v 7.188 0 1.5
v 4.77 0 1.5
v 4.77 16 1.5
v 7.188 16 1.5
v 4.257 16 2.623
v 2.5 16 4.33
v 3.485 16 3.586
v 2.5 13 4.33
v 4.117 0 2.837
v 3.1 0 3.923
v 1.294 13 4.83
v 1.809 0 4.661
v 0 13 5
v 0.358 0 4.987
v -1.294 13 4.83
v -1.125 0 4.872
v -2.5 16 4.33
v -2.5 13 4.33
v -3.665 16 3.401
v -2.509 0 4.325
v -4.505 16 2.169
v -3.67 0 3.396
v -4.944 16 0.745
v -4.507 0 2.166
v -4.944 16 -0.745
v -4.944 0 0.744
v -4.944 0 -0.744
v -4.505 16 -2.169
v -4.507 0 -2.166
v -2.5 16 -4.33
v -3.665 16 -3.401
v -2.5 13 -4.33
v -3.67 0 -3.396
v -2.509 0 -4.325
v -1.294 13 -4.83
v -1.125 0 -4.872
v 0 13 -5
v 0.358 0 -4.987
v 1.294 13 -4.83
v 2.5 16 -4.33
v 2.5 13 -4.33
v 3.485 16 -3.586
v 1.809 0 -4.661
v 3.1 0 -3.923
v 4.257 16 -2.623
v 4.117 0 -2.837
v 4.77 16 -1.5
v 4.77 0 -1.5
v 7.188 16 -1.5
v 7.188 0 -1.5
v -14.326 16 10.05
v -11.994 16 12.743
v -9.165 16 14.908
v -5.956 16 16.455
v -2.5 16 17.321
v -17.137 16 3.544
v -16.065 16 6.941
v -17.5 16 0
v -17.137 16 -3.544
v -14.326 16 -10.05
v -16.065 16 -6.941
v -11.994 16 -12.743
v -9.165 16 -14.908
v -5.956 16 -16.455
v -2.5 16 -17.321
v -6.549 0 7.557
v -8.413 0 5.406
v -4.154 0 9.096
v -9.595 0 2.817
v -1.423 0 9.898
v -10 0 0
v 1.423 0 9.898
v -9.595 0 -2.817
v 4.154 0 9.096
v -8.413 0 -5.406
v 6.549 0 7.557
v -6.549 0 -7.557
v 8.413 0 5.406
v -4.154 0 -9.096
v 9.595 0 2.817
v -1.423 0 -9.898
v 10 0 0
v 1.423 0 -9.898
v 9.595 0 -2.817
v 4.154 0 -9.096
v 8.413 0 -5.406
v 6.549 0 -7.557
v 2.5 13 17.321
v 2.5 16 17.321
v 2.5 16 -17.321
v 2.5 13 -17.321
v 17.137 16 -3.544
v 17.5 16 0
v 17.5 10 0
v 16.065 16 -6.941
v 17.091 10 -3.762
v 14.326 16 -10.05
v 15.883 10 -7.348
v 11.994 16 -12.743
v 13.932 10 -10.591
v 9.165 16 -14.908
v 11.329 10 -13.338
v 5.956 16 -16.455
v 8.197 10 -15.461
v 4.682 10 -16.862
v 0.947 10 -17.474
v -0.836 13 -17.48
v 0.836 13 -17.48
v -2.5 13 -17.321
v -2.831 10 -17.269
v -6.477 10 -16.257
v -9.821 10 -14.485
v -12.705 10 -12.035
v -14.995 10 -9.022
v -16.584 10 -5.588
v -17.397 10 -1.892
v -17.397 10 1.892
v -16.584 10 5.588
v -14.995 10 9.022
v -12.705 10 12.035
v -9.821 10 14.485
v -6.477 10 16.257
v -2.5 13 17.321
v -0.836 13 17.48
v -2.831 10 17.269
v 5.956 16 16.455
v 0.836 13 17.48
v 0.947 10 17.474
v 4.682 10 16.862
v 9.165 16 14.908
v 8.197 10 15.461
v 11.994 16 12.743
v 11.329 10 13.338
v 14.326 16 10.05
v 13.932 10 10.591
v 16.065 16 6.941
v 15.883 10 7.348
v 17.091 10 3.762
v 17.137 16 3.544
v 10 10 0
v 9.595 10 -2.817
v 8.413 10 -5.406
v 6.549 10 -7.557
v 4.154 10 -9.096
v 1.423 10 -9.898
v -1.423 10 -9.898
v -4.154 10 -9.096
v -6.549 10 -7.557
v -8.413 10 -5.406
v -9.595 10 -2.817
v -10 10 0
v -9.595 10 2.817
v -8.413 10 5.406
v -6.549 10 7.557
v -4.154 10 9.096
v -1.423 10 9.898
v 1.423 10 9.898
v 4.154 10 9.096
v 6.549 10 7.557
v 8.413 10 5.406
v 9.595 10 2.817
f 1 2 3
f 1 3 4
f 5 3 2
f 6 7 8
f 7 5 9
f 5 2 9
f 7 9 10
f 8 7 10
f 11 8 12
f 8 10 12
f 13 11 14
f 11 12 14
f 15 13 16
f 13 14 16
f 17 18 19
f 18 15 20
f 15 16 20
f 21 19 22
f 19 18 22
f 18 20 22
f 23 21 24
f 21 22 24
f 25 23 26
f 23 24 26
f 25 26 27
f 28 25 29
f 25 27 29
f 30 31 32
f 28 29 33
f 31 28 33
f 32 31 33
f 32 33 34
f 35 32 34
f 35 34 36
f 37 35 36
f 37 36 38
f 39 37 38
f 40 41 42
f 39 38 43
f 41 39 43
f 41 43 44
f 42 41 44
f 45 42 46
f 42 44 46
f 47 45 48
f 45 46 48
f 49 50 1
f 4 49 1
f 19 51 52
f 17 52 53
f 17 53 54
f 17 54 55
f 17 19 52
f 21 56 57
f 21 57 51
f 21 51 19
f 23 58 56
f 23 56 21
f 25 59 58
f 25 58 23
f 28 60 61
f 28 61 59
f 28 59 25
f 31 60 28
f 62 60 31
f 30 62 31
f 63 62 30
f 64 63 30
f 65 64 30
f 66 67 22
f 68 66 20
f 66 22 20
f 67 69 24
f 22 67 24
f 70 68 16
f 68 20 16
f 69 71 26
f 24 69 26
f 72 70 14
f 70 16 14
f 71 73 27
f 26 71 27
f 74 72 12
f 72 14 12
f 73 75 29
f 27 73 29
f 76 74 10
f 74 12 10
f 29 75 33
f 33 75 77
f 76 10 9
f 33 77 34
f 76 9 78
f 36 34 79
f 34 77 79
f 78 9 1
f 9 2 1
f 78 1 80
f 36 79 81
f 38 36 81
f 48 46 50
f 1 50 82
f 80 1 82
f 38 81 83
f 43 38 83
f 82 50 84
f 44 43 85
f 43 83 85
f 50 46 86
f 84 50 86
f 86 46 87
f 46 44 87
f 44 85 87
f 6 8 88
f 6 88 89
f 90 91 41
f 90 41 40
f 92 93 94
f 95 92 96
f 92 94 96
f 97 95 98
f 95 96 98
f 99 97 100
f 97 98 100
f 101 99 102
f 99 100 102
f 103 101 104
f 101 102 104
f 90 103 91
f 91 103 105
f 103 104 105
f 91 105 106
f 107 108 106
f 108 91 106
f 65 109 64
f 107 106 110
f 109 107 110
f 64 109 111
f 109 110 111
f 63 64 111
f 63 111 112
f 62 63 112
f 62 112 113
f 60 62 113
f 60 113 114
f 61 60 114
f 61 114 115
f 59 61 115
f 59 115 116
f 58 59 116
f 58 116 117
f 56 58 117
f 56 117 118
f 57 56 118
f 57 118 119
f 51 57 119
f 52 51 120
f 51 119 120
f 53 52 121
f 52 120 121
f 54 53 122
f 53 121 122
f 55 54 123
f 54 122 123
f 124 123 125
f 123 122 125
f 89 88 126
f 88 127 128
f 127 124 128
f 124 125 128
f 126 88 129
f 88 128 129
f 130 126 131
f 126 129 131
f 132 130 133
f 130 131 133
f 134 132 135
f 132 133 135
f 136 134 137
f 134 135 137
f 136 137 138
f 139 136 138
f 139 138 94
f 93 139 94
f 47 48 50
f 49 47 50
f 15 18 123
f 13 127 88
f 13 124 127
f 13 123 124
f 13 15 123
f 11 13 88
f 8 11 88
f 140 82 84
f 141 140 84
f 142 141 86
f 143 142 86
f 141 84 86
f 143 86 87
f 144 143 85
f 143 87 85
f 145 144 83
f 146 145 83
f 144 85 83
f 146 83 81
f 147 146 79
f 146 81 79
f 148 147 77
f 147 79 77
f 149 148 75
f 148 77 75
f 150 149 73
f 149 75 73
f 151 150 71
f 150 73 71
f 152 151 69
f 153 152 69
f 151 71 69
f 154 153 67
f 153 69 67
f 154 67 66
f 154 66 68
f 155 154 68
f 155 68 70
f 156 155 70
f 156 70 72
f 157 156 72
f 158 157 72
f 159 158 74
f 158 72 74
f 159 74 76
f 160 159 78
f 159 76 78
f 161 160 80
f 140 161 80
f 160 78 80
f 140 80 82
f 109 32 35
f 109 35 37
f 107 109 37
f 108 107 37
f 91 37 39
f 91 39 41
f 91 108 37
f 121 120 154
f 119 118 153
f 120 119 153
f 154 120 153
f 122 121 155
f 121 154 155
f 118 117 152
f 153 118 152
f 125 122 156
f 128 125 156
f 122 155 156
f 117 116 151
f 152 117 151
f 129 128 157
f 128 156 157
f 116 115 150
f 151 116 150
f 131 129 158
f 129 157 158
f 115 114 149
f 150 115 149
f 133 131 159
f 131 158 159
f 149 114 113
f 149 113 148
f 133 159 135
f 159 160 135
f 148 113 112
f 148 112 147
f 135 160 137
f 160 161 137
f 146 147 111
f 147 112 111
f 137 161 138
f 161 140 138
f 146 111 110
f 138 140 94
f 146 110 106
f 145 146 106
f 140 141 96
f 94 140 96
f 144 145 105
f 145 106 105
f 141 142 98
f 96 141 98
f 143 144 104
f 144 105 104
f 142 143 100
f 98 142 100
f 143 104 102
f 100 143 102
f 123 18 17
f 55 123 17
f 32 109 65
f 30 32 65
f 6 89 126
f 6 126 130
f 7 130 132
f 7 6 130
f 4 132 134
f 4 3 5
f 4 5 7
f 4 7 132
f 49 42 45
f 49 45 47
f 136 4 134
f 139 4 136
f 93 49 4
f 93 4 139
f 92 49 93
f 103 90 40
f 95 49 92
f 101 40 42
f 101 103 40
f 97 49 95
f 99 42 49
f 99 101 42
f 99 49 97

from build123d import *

# Parameters (mm, degrees)
SKETCH1_R               = 10
SKETCH1_R_2             = 5
BOSS_EXTRUDE1_DEPTH     = 10
SKETCH2_R               = 17.5
BOSS_EXTRUDE2_DEPTH     = 6
SKETCH3_W               = 5
SKETCH3_H               = 3
CUT_EXTRUDE1_DEPTH      = 27
CUT_EXTRUDE1_DEPTH_BACK = 20
SKETCH4_R               = 5
CUT_EXTRUDE2_DEPTH      = 20
SKETCH6_W               = 2.522698513
SKETCH6_H               = 3
CUT_EXTRUDE3_DEPTH      = 20


with BuildPart() as part:
    # Sketch1 → Boss-Extrude1 (new body)
    with BuildSketch(Plane(origin=(0, 0, 0), x_dir=(1, 0, 0), z_dir=(0, 1, 0))):
        Circle(SKETCH1_R)
        Circle(SKETCH1_R_2, mode=Mode.SUBTRACT)
    extrude(amount=BOSS_EXTRUDE1_DEPTH)

    # Sketch2 → Boss-Extrude2 (add)
    with BuildSketch(Plane(origin=(0, 10, 0), x_dir=(1, 0, 0), z_dir=(0, 1, 0))):
        Circle(SKETCH2_R)
    extrude(amount=BOSS_EXTRUDE2_DEPTH)

    # Sketch3 → Cut-Extrude1 (cut, two sides)
    with BuildSketch(Plane.XY) as cut_extrude1_sk:
        with Locations((0, 14.5)):
            Rectangle(SKETCH3_W, SKETCH3_H)
    extrude(amount=CUT_EXTRUDE1_DEPTH, mode=Mode.SUBTRACT)
    extrude(cut_extrude1_sk.sketch, amount=-CUT_EXTRUDE1_DEPTH_BACK, mode=Mode.SUBTRACT)

    # Sketch4 → Cut-Extrude2 (cut)
    with BuildSketch(Plane.XZ.offset(-10)):
        Circle(SKETCH4_R)
    extrude(amount=-CUT_EXTRUDE2_DEPTH, mode=Mode.SUBTRACT)

    # Sketch6 → Cut-Extrude3 (cut)
    with BuildSketch(Plane.XZ):
        with Locations((5.927019422, 0)):
            Rectangle(SKETCH6_W, SKETCH6_H)
    extrude(amount=-CUT_EXTRUDE3_DEPTH, mode=Mode.SUBTRACT)


solid = part.part
